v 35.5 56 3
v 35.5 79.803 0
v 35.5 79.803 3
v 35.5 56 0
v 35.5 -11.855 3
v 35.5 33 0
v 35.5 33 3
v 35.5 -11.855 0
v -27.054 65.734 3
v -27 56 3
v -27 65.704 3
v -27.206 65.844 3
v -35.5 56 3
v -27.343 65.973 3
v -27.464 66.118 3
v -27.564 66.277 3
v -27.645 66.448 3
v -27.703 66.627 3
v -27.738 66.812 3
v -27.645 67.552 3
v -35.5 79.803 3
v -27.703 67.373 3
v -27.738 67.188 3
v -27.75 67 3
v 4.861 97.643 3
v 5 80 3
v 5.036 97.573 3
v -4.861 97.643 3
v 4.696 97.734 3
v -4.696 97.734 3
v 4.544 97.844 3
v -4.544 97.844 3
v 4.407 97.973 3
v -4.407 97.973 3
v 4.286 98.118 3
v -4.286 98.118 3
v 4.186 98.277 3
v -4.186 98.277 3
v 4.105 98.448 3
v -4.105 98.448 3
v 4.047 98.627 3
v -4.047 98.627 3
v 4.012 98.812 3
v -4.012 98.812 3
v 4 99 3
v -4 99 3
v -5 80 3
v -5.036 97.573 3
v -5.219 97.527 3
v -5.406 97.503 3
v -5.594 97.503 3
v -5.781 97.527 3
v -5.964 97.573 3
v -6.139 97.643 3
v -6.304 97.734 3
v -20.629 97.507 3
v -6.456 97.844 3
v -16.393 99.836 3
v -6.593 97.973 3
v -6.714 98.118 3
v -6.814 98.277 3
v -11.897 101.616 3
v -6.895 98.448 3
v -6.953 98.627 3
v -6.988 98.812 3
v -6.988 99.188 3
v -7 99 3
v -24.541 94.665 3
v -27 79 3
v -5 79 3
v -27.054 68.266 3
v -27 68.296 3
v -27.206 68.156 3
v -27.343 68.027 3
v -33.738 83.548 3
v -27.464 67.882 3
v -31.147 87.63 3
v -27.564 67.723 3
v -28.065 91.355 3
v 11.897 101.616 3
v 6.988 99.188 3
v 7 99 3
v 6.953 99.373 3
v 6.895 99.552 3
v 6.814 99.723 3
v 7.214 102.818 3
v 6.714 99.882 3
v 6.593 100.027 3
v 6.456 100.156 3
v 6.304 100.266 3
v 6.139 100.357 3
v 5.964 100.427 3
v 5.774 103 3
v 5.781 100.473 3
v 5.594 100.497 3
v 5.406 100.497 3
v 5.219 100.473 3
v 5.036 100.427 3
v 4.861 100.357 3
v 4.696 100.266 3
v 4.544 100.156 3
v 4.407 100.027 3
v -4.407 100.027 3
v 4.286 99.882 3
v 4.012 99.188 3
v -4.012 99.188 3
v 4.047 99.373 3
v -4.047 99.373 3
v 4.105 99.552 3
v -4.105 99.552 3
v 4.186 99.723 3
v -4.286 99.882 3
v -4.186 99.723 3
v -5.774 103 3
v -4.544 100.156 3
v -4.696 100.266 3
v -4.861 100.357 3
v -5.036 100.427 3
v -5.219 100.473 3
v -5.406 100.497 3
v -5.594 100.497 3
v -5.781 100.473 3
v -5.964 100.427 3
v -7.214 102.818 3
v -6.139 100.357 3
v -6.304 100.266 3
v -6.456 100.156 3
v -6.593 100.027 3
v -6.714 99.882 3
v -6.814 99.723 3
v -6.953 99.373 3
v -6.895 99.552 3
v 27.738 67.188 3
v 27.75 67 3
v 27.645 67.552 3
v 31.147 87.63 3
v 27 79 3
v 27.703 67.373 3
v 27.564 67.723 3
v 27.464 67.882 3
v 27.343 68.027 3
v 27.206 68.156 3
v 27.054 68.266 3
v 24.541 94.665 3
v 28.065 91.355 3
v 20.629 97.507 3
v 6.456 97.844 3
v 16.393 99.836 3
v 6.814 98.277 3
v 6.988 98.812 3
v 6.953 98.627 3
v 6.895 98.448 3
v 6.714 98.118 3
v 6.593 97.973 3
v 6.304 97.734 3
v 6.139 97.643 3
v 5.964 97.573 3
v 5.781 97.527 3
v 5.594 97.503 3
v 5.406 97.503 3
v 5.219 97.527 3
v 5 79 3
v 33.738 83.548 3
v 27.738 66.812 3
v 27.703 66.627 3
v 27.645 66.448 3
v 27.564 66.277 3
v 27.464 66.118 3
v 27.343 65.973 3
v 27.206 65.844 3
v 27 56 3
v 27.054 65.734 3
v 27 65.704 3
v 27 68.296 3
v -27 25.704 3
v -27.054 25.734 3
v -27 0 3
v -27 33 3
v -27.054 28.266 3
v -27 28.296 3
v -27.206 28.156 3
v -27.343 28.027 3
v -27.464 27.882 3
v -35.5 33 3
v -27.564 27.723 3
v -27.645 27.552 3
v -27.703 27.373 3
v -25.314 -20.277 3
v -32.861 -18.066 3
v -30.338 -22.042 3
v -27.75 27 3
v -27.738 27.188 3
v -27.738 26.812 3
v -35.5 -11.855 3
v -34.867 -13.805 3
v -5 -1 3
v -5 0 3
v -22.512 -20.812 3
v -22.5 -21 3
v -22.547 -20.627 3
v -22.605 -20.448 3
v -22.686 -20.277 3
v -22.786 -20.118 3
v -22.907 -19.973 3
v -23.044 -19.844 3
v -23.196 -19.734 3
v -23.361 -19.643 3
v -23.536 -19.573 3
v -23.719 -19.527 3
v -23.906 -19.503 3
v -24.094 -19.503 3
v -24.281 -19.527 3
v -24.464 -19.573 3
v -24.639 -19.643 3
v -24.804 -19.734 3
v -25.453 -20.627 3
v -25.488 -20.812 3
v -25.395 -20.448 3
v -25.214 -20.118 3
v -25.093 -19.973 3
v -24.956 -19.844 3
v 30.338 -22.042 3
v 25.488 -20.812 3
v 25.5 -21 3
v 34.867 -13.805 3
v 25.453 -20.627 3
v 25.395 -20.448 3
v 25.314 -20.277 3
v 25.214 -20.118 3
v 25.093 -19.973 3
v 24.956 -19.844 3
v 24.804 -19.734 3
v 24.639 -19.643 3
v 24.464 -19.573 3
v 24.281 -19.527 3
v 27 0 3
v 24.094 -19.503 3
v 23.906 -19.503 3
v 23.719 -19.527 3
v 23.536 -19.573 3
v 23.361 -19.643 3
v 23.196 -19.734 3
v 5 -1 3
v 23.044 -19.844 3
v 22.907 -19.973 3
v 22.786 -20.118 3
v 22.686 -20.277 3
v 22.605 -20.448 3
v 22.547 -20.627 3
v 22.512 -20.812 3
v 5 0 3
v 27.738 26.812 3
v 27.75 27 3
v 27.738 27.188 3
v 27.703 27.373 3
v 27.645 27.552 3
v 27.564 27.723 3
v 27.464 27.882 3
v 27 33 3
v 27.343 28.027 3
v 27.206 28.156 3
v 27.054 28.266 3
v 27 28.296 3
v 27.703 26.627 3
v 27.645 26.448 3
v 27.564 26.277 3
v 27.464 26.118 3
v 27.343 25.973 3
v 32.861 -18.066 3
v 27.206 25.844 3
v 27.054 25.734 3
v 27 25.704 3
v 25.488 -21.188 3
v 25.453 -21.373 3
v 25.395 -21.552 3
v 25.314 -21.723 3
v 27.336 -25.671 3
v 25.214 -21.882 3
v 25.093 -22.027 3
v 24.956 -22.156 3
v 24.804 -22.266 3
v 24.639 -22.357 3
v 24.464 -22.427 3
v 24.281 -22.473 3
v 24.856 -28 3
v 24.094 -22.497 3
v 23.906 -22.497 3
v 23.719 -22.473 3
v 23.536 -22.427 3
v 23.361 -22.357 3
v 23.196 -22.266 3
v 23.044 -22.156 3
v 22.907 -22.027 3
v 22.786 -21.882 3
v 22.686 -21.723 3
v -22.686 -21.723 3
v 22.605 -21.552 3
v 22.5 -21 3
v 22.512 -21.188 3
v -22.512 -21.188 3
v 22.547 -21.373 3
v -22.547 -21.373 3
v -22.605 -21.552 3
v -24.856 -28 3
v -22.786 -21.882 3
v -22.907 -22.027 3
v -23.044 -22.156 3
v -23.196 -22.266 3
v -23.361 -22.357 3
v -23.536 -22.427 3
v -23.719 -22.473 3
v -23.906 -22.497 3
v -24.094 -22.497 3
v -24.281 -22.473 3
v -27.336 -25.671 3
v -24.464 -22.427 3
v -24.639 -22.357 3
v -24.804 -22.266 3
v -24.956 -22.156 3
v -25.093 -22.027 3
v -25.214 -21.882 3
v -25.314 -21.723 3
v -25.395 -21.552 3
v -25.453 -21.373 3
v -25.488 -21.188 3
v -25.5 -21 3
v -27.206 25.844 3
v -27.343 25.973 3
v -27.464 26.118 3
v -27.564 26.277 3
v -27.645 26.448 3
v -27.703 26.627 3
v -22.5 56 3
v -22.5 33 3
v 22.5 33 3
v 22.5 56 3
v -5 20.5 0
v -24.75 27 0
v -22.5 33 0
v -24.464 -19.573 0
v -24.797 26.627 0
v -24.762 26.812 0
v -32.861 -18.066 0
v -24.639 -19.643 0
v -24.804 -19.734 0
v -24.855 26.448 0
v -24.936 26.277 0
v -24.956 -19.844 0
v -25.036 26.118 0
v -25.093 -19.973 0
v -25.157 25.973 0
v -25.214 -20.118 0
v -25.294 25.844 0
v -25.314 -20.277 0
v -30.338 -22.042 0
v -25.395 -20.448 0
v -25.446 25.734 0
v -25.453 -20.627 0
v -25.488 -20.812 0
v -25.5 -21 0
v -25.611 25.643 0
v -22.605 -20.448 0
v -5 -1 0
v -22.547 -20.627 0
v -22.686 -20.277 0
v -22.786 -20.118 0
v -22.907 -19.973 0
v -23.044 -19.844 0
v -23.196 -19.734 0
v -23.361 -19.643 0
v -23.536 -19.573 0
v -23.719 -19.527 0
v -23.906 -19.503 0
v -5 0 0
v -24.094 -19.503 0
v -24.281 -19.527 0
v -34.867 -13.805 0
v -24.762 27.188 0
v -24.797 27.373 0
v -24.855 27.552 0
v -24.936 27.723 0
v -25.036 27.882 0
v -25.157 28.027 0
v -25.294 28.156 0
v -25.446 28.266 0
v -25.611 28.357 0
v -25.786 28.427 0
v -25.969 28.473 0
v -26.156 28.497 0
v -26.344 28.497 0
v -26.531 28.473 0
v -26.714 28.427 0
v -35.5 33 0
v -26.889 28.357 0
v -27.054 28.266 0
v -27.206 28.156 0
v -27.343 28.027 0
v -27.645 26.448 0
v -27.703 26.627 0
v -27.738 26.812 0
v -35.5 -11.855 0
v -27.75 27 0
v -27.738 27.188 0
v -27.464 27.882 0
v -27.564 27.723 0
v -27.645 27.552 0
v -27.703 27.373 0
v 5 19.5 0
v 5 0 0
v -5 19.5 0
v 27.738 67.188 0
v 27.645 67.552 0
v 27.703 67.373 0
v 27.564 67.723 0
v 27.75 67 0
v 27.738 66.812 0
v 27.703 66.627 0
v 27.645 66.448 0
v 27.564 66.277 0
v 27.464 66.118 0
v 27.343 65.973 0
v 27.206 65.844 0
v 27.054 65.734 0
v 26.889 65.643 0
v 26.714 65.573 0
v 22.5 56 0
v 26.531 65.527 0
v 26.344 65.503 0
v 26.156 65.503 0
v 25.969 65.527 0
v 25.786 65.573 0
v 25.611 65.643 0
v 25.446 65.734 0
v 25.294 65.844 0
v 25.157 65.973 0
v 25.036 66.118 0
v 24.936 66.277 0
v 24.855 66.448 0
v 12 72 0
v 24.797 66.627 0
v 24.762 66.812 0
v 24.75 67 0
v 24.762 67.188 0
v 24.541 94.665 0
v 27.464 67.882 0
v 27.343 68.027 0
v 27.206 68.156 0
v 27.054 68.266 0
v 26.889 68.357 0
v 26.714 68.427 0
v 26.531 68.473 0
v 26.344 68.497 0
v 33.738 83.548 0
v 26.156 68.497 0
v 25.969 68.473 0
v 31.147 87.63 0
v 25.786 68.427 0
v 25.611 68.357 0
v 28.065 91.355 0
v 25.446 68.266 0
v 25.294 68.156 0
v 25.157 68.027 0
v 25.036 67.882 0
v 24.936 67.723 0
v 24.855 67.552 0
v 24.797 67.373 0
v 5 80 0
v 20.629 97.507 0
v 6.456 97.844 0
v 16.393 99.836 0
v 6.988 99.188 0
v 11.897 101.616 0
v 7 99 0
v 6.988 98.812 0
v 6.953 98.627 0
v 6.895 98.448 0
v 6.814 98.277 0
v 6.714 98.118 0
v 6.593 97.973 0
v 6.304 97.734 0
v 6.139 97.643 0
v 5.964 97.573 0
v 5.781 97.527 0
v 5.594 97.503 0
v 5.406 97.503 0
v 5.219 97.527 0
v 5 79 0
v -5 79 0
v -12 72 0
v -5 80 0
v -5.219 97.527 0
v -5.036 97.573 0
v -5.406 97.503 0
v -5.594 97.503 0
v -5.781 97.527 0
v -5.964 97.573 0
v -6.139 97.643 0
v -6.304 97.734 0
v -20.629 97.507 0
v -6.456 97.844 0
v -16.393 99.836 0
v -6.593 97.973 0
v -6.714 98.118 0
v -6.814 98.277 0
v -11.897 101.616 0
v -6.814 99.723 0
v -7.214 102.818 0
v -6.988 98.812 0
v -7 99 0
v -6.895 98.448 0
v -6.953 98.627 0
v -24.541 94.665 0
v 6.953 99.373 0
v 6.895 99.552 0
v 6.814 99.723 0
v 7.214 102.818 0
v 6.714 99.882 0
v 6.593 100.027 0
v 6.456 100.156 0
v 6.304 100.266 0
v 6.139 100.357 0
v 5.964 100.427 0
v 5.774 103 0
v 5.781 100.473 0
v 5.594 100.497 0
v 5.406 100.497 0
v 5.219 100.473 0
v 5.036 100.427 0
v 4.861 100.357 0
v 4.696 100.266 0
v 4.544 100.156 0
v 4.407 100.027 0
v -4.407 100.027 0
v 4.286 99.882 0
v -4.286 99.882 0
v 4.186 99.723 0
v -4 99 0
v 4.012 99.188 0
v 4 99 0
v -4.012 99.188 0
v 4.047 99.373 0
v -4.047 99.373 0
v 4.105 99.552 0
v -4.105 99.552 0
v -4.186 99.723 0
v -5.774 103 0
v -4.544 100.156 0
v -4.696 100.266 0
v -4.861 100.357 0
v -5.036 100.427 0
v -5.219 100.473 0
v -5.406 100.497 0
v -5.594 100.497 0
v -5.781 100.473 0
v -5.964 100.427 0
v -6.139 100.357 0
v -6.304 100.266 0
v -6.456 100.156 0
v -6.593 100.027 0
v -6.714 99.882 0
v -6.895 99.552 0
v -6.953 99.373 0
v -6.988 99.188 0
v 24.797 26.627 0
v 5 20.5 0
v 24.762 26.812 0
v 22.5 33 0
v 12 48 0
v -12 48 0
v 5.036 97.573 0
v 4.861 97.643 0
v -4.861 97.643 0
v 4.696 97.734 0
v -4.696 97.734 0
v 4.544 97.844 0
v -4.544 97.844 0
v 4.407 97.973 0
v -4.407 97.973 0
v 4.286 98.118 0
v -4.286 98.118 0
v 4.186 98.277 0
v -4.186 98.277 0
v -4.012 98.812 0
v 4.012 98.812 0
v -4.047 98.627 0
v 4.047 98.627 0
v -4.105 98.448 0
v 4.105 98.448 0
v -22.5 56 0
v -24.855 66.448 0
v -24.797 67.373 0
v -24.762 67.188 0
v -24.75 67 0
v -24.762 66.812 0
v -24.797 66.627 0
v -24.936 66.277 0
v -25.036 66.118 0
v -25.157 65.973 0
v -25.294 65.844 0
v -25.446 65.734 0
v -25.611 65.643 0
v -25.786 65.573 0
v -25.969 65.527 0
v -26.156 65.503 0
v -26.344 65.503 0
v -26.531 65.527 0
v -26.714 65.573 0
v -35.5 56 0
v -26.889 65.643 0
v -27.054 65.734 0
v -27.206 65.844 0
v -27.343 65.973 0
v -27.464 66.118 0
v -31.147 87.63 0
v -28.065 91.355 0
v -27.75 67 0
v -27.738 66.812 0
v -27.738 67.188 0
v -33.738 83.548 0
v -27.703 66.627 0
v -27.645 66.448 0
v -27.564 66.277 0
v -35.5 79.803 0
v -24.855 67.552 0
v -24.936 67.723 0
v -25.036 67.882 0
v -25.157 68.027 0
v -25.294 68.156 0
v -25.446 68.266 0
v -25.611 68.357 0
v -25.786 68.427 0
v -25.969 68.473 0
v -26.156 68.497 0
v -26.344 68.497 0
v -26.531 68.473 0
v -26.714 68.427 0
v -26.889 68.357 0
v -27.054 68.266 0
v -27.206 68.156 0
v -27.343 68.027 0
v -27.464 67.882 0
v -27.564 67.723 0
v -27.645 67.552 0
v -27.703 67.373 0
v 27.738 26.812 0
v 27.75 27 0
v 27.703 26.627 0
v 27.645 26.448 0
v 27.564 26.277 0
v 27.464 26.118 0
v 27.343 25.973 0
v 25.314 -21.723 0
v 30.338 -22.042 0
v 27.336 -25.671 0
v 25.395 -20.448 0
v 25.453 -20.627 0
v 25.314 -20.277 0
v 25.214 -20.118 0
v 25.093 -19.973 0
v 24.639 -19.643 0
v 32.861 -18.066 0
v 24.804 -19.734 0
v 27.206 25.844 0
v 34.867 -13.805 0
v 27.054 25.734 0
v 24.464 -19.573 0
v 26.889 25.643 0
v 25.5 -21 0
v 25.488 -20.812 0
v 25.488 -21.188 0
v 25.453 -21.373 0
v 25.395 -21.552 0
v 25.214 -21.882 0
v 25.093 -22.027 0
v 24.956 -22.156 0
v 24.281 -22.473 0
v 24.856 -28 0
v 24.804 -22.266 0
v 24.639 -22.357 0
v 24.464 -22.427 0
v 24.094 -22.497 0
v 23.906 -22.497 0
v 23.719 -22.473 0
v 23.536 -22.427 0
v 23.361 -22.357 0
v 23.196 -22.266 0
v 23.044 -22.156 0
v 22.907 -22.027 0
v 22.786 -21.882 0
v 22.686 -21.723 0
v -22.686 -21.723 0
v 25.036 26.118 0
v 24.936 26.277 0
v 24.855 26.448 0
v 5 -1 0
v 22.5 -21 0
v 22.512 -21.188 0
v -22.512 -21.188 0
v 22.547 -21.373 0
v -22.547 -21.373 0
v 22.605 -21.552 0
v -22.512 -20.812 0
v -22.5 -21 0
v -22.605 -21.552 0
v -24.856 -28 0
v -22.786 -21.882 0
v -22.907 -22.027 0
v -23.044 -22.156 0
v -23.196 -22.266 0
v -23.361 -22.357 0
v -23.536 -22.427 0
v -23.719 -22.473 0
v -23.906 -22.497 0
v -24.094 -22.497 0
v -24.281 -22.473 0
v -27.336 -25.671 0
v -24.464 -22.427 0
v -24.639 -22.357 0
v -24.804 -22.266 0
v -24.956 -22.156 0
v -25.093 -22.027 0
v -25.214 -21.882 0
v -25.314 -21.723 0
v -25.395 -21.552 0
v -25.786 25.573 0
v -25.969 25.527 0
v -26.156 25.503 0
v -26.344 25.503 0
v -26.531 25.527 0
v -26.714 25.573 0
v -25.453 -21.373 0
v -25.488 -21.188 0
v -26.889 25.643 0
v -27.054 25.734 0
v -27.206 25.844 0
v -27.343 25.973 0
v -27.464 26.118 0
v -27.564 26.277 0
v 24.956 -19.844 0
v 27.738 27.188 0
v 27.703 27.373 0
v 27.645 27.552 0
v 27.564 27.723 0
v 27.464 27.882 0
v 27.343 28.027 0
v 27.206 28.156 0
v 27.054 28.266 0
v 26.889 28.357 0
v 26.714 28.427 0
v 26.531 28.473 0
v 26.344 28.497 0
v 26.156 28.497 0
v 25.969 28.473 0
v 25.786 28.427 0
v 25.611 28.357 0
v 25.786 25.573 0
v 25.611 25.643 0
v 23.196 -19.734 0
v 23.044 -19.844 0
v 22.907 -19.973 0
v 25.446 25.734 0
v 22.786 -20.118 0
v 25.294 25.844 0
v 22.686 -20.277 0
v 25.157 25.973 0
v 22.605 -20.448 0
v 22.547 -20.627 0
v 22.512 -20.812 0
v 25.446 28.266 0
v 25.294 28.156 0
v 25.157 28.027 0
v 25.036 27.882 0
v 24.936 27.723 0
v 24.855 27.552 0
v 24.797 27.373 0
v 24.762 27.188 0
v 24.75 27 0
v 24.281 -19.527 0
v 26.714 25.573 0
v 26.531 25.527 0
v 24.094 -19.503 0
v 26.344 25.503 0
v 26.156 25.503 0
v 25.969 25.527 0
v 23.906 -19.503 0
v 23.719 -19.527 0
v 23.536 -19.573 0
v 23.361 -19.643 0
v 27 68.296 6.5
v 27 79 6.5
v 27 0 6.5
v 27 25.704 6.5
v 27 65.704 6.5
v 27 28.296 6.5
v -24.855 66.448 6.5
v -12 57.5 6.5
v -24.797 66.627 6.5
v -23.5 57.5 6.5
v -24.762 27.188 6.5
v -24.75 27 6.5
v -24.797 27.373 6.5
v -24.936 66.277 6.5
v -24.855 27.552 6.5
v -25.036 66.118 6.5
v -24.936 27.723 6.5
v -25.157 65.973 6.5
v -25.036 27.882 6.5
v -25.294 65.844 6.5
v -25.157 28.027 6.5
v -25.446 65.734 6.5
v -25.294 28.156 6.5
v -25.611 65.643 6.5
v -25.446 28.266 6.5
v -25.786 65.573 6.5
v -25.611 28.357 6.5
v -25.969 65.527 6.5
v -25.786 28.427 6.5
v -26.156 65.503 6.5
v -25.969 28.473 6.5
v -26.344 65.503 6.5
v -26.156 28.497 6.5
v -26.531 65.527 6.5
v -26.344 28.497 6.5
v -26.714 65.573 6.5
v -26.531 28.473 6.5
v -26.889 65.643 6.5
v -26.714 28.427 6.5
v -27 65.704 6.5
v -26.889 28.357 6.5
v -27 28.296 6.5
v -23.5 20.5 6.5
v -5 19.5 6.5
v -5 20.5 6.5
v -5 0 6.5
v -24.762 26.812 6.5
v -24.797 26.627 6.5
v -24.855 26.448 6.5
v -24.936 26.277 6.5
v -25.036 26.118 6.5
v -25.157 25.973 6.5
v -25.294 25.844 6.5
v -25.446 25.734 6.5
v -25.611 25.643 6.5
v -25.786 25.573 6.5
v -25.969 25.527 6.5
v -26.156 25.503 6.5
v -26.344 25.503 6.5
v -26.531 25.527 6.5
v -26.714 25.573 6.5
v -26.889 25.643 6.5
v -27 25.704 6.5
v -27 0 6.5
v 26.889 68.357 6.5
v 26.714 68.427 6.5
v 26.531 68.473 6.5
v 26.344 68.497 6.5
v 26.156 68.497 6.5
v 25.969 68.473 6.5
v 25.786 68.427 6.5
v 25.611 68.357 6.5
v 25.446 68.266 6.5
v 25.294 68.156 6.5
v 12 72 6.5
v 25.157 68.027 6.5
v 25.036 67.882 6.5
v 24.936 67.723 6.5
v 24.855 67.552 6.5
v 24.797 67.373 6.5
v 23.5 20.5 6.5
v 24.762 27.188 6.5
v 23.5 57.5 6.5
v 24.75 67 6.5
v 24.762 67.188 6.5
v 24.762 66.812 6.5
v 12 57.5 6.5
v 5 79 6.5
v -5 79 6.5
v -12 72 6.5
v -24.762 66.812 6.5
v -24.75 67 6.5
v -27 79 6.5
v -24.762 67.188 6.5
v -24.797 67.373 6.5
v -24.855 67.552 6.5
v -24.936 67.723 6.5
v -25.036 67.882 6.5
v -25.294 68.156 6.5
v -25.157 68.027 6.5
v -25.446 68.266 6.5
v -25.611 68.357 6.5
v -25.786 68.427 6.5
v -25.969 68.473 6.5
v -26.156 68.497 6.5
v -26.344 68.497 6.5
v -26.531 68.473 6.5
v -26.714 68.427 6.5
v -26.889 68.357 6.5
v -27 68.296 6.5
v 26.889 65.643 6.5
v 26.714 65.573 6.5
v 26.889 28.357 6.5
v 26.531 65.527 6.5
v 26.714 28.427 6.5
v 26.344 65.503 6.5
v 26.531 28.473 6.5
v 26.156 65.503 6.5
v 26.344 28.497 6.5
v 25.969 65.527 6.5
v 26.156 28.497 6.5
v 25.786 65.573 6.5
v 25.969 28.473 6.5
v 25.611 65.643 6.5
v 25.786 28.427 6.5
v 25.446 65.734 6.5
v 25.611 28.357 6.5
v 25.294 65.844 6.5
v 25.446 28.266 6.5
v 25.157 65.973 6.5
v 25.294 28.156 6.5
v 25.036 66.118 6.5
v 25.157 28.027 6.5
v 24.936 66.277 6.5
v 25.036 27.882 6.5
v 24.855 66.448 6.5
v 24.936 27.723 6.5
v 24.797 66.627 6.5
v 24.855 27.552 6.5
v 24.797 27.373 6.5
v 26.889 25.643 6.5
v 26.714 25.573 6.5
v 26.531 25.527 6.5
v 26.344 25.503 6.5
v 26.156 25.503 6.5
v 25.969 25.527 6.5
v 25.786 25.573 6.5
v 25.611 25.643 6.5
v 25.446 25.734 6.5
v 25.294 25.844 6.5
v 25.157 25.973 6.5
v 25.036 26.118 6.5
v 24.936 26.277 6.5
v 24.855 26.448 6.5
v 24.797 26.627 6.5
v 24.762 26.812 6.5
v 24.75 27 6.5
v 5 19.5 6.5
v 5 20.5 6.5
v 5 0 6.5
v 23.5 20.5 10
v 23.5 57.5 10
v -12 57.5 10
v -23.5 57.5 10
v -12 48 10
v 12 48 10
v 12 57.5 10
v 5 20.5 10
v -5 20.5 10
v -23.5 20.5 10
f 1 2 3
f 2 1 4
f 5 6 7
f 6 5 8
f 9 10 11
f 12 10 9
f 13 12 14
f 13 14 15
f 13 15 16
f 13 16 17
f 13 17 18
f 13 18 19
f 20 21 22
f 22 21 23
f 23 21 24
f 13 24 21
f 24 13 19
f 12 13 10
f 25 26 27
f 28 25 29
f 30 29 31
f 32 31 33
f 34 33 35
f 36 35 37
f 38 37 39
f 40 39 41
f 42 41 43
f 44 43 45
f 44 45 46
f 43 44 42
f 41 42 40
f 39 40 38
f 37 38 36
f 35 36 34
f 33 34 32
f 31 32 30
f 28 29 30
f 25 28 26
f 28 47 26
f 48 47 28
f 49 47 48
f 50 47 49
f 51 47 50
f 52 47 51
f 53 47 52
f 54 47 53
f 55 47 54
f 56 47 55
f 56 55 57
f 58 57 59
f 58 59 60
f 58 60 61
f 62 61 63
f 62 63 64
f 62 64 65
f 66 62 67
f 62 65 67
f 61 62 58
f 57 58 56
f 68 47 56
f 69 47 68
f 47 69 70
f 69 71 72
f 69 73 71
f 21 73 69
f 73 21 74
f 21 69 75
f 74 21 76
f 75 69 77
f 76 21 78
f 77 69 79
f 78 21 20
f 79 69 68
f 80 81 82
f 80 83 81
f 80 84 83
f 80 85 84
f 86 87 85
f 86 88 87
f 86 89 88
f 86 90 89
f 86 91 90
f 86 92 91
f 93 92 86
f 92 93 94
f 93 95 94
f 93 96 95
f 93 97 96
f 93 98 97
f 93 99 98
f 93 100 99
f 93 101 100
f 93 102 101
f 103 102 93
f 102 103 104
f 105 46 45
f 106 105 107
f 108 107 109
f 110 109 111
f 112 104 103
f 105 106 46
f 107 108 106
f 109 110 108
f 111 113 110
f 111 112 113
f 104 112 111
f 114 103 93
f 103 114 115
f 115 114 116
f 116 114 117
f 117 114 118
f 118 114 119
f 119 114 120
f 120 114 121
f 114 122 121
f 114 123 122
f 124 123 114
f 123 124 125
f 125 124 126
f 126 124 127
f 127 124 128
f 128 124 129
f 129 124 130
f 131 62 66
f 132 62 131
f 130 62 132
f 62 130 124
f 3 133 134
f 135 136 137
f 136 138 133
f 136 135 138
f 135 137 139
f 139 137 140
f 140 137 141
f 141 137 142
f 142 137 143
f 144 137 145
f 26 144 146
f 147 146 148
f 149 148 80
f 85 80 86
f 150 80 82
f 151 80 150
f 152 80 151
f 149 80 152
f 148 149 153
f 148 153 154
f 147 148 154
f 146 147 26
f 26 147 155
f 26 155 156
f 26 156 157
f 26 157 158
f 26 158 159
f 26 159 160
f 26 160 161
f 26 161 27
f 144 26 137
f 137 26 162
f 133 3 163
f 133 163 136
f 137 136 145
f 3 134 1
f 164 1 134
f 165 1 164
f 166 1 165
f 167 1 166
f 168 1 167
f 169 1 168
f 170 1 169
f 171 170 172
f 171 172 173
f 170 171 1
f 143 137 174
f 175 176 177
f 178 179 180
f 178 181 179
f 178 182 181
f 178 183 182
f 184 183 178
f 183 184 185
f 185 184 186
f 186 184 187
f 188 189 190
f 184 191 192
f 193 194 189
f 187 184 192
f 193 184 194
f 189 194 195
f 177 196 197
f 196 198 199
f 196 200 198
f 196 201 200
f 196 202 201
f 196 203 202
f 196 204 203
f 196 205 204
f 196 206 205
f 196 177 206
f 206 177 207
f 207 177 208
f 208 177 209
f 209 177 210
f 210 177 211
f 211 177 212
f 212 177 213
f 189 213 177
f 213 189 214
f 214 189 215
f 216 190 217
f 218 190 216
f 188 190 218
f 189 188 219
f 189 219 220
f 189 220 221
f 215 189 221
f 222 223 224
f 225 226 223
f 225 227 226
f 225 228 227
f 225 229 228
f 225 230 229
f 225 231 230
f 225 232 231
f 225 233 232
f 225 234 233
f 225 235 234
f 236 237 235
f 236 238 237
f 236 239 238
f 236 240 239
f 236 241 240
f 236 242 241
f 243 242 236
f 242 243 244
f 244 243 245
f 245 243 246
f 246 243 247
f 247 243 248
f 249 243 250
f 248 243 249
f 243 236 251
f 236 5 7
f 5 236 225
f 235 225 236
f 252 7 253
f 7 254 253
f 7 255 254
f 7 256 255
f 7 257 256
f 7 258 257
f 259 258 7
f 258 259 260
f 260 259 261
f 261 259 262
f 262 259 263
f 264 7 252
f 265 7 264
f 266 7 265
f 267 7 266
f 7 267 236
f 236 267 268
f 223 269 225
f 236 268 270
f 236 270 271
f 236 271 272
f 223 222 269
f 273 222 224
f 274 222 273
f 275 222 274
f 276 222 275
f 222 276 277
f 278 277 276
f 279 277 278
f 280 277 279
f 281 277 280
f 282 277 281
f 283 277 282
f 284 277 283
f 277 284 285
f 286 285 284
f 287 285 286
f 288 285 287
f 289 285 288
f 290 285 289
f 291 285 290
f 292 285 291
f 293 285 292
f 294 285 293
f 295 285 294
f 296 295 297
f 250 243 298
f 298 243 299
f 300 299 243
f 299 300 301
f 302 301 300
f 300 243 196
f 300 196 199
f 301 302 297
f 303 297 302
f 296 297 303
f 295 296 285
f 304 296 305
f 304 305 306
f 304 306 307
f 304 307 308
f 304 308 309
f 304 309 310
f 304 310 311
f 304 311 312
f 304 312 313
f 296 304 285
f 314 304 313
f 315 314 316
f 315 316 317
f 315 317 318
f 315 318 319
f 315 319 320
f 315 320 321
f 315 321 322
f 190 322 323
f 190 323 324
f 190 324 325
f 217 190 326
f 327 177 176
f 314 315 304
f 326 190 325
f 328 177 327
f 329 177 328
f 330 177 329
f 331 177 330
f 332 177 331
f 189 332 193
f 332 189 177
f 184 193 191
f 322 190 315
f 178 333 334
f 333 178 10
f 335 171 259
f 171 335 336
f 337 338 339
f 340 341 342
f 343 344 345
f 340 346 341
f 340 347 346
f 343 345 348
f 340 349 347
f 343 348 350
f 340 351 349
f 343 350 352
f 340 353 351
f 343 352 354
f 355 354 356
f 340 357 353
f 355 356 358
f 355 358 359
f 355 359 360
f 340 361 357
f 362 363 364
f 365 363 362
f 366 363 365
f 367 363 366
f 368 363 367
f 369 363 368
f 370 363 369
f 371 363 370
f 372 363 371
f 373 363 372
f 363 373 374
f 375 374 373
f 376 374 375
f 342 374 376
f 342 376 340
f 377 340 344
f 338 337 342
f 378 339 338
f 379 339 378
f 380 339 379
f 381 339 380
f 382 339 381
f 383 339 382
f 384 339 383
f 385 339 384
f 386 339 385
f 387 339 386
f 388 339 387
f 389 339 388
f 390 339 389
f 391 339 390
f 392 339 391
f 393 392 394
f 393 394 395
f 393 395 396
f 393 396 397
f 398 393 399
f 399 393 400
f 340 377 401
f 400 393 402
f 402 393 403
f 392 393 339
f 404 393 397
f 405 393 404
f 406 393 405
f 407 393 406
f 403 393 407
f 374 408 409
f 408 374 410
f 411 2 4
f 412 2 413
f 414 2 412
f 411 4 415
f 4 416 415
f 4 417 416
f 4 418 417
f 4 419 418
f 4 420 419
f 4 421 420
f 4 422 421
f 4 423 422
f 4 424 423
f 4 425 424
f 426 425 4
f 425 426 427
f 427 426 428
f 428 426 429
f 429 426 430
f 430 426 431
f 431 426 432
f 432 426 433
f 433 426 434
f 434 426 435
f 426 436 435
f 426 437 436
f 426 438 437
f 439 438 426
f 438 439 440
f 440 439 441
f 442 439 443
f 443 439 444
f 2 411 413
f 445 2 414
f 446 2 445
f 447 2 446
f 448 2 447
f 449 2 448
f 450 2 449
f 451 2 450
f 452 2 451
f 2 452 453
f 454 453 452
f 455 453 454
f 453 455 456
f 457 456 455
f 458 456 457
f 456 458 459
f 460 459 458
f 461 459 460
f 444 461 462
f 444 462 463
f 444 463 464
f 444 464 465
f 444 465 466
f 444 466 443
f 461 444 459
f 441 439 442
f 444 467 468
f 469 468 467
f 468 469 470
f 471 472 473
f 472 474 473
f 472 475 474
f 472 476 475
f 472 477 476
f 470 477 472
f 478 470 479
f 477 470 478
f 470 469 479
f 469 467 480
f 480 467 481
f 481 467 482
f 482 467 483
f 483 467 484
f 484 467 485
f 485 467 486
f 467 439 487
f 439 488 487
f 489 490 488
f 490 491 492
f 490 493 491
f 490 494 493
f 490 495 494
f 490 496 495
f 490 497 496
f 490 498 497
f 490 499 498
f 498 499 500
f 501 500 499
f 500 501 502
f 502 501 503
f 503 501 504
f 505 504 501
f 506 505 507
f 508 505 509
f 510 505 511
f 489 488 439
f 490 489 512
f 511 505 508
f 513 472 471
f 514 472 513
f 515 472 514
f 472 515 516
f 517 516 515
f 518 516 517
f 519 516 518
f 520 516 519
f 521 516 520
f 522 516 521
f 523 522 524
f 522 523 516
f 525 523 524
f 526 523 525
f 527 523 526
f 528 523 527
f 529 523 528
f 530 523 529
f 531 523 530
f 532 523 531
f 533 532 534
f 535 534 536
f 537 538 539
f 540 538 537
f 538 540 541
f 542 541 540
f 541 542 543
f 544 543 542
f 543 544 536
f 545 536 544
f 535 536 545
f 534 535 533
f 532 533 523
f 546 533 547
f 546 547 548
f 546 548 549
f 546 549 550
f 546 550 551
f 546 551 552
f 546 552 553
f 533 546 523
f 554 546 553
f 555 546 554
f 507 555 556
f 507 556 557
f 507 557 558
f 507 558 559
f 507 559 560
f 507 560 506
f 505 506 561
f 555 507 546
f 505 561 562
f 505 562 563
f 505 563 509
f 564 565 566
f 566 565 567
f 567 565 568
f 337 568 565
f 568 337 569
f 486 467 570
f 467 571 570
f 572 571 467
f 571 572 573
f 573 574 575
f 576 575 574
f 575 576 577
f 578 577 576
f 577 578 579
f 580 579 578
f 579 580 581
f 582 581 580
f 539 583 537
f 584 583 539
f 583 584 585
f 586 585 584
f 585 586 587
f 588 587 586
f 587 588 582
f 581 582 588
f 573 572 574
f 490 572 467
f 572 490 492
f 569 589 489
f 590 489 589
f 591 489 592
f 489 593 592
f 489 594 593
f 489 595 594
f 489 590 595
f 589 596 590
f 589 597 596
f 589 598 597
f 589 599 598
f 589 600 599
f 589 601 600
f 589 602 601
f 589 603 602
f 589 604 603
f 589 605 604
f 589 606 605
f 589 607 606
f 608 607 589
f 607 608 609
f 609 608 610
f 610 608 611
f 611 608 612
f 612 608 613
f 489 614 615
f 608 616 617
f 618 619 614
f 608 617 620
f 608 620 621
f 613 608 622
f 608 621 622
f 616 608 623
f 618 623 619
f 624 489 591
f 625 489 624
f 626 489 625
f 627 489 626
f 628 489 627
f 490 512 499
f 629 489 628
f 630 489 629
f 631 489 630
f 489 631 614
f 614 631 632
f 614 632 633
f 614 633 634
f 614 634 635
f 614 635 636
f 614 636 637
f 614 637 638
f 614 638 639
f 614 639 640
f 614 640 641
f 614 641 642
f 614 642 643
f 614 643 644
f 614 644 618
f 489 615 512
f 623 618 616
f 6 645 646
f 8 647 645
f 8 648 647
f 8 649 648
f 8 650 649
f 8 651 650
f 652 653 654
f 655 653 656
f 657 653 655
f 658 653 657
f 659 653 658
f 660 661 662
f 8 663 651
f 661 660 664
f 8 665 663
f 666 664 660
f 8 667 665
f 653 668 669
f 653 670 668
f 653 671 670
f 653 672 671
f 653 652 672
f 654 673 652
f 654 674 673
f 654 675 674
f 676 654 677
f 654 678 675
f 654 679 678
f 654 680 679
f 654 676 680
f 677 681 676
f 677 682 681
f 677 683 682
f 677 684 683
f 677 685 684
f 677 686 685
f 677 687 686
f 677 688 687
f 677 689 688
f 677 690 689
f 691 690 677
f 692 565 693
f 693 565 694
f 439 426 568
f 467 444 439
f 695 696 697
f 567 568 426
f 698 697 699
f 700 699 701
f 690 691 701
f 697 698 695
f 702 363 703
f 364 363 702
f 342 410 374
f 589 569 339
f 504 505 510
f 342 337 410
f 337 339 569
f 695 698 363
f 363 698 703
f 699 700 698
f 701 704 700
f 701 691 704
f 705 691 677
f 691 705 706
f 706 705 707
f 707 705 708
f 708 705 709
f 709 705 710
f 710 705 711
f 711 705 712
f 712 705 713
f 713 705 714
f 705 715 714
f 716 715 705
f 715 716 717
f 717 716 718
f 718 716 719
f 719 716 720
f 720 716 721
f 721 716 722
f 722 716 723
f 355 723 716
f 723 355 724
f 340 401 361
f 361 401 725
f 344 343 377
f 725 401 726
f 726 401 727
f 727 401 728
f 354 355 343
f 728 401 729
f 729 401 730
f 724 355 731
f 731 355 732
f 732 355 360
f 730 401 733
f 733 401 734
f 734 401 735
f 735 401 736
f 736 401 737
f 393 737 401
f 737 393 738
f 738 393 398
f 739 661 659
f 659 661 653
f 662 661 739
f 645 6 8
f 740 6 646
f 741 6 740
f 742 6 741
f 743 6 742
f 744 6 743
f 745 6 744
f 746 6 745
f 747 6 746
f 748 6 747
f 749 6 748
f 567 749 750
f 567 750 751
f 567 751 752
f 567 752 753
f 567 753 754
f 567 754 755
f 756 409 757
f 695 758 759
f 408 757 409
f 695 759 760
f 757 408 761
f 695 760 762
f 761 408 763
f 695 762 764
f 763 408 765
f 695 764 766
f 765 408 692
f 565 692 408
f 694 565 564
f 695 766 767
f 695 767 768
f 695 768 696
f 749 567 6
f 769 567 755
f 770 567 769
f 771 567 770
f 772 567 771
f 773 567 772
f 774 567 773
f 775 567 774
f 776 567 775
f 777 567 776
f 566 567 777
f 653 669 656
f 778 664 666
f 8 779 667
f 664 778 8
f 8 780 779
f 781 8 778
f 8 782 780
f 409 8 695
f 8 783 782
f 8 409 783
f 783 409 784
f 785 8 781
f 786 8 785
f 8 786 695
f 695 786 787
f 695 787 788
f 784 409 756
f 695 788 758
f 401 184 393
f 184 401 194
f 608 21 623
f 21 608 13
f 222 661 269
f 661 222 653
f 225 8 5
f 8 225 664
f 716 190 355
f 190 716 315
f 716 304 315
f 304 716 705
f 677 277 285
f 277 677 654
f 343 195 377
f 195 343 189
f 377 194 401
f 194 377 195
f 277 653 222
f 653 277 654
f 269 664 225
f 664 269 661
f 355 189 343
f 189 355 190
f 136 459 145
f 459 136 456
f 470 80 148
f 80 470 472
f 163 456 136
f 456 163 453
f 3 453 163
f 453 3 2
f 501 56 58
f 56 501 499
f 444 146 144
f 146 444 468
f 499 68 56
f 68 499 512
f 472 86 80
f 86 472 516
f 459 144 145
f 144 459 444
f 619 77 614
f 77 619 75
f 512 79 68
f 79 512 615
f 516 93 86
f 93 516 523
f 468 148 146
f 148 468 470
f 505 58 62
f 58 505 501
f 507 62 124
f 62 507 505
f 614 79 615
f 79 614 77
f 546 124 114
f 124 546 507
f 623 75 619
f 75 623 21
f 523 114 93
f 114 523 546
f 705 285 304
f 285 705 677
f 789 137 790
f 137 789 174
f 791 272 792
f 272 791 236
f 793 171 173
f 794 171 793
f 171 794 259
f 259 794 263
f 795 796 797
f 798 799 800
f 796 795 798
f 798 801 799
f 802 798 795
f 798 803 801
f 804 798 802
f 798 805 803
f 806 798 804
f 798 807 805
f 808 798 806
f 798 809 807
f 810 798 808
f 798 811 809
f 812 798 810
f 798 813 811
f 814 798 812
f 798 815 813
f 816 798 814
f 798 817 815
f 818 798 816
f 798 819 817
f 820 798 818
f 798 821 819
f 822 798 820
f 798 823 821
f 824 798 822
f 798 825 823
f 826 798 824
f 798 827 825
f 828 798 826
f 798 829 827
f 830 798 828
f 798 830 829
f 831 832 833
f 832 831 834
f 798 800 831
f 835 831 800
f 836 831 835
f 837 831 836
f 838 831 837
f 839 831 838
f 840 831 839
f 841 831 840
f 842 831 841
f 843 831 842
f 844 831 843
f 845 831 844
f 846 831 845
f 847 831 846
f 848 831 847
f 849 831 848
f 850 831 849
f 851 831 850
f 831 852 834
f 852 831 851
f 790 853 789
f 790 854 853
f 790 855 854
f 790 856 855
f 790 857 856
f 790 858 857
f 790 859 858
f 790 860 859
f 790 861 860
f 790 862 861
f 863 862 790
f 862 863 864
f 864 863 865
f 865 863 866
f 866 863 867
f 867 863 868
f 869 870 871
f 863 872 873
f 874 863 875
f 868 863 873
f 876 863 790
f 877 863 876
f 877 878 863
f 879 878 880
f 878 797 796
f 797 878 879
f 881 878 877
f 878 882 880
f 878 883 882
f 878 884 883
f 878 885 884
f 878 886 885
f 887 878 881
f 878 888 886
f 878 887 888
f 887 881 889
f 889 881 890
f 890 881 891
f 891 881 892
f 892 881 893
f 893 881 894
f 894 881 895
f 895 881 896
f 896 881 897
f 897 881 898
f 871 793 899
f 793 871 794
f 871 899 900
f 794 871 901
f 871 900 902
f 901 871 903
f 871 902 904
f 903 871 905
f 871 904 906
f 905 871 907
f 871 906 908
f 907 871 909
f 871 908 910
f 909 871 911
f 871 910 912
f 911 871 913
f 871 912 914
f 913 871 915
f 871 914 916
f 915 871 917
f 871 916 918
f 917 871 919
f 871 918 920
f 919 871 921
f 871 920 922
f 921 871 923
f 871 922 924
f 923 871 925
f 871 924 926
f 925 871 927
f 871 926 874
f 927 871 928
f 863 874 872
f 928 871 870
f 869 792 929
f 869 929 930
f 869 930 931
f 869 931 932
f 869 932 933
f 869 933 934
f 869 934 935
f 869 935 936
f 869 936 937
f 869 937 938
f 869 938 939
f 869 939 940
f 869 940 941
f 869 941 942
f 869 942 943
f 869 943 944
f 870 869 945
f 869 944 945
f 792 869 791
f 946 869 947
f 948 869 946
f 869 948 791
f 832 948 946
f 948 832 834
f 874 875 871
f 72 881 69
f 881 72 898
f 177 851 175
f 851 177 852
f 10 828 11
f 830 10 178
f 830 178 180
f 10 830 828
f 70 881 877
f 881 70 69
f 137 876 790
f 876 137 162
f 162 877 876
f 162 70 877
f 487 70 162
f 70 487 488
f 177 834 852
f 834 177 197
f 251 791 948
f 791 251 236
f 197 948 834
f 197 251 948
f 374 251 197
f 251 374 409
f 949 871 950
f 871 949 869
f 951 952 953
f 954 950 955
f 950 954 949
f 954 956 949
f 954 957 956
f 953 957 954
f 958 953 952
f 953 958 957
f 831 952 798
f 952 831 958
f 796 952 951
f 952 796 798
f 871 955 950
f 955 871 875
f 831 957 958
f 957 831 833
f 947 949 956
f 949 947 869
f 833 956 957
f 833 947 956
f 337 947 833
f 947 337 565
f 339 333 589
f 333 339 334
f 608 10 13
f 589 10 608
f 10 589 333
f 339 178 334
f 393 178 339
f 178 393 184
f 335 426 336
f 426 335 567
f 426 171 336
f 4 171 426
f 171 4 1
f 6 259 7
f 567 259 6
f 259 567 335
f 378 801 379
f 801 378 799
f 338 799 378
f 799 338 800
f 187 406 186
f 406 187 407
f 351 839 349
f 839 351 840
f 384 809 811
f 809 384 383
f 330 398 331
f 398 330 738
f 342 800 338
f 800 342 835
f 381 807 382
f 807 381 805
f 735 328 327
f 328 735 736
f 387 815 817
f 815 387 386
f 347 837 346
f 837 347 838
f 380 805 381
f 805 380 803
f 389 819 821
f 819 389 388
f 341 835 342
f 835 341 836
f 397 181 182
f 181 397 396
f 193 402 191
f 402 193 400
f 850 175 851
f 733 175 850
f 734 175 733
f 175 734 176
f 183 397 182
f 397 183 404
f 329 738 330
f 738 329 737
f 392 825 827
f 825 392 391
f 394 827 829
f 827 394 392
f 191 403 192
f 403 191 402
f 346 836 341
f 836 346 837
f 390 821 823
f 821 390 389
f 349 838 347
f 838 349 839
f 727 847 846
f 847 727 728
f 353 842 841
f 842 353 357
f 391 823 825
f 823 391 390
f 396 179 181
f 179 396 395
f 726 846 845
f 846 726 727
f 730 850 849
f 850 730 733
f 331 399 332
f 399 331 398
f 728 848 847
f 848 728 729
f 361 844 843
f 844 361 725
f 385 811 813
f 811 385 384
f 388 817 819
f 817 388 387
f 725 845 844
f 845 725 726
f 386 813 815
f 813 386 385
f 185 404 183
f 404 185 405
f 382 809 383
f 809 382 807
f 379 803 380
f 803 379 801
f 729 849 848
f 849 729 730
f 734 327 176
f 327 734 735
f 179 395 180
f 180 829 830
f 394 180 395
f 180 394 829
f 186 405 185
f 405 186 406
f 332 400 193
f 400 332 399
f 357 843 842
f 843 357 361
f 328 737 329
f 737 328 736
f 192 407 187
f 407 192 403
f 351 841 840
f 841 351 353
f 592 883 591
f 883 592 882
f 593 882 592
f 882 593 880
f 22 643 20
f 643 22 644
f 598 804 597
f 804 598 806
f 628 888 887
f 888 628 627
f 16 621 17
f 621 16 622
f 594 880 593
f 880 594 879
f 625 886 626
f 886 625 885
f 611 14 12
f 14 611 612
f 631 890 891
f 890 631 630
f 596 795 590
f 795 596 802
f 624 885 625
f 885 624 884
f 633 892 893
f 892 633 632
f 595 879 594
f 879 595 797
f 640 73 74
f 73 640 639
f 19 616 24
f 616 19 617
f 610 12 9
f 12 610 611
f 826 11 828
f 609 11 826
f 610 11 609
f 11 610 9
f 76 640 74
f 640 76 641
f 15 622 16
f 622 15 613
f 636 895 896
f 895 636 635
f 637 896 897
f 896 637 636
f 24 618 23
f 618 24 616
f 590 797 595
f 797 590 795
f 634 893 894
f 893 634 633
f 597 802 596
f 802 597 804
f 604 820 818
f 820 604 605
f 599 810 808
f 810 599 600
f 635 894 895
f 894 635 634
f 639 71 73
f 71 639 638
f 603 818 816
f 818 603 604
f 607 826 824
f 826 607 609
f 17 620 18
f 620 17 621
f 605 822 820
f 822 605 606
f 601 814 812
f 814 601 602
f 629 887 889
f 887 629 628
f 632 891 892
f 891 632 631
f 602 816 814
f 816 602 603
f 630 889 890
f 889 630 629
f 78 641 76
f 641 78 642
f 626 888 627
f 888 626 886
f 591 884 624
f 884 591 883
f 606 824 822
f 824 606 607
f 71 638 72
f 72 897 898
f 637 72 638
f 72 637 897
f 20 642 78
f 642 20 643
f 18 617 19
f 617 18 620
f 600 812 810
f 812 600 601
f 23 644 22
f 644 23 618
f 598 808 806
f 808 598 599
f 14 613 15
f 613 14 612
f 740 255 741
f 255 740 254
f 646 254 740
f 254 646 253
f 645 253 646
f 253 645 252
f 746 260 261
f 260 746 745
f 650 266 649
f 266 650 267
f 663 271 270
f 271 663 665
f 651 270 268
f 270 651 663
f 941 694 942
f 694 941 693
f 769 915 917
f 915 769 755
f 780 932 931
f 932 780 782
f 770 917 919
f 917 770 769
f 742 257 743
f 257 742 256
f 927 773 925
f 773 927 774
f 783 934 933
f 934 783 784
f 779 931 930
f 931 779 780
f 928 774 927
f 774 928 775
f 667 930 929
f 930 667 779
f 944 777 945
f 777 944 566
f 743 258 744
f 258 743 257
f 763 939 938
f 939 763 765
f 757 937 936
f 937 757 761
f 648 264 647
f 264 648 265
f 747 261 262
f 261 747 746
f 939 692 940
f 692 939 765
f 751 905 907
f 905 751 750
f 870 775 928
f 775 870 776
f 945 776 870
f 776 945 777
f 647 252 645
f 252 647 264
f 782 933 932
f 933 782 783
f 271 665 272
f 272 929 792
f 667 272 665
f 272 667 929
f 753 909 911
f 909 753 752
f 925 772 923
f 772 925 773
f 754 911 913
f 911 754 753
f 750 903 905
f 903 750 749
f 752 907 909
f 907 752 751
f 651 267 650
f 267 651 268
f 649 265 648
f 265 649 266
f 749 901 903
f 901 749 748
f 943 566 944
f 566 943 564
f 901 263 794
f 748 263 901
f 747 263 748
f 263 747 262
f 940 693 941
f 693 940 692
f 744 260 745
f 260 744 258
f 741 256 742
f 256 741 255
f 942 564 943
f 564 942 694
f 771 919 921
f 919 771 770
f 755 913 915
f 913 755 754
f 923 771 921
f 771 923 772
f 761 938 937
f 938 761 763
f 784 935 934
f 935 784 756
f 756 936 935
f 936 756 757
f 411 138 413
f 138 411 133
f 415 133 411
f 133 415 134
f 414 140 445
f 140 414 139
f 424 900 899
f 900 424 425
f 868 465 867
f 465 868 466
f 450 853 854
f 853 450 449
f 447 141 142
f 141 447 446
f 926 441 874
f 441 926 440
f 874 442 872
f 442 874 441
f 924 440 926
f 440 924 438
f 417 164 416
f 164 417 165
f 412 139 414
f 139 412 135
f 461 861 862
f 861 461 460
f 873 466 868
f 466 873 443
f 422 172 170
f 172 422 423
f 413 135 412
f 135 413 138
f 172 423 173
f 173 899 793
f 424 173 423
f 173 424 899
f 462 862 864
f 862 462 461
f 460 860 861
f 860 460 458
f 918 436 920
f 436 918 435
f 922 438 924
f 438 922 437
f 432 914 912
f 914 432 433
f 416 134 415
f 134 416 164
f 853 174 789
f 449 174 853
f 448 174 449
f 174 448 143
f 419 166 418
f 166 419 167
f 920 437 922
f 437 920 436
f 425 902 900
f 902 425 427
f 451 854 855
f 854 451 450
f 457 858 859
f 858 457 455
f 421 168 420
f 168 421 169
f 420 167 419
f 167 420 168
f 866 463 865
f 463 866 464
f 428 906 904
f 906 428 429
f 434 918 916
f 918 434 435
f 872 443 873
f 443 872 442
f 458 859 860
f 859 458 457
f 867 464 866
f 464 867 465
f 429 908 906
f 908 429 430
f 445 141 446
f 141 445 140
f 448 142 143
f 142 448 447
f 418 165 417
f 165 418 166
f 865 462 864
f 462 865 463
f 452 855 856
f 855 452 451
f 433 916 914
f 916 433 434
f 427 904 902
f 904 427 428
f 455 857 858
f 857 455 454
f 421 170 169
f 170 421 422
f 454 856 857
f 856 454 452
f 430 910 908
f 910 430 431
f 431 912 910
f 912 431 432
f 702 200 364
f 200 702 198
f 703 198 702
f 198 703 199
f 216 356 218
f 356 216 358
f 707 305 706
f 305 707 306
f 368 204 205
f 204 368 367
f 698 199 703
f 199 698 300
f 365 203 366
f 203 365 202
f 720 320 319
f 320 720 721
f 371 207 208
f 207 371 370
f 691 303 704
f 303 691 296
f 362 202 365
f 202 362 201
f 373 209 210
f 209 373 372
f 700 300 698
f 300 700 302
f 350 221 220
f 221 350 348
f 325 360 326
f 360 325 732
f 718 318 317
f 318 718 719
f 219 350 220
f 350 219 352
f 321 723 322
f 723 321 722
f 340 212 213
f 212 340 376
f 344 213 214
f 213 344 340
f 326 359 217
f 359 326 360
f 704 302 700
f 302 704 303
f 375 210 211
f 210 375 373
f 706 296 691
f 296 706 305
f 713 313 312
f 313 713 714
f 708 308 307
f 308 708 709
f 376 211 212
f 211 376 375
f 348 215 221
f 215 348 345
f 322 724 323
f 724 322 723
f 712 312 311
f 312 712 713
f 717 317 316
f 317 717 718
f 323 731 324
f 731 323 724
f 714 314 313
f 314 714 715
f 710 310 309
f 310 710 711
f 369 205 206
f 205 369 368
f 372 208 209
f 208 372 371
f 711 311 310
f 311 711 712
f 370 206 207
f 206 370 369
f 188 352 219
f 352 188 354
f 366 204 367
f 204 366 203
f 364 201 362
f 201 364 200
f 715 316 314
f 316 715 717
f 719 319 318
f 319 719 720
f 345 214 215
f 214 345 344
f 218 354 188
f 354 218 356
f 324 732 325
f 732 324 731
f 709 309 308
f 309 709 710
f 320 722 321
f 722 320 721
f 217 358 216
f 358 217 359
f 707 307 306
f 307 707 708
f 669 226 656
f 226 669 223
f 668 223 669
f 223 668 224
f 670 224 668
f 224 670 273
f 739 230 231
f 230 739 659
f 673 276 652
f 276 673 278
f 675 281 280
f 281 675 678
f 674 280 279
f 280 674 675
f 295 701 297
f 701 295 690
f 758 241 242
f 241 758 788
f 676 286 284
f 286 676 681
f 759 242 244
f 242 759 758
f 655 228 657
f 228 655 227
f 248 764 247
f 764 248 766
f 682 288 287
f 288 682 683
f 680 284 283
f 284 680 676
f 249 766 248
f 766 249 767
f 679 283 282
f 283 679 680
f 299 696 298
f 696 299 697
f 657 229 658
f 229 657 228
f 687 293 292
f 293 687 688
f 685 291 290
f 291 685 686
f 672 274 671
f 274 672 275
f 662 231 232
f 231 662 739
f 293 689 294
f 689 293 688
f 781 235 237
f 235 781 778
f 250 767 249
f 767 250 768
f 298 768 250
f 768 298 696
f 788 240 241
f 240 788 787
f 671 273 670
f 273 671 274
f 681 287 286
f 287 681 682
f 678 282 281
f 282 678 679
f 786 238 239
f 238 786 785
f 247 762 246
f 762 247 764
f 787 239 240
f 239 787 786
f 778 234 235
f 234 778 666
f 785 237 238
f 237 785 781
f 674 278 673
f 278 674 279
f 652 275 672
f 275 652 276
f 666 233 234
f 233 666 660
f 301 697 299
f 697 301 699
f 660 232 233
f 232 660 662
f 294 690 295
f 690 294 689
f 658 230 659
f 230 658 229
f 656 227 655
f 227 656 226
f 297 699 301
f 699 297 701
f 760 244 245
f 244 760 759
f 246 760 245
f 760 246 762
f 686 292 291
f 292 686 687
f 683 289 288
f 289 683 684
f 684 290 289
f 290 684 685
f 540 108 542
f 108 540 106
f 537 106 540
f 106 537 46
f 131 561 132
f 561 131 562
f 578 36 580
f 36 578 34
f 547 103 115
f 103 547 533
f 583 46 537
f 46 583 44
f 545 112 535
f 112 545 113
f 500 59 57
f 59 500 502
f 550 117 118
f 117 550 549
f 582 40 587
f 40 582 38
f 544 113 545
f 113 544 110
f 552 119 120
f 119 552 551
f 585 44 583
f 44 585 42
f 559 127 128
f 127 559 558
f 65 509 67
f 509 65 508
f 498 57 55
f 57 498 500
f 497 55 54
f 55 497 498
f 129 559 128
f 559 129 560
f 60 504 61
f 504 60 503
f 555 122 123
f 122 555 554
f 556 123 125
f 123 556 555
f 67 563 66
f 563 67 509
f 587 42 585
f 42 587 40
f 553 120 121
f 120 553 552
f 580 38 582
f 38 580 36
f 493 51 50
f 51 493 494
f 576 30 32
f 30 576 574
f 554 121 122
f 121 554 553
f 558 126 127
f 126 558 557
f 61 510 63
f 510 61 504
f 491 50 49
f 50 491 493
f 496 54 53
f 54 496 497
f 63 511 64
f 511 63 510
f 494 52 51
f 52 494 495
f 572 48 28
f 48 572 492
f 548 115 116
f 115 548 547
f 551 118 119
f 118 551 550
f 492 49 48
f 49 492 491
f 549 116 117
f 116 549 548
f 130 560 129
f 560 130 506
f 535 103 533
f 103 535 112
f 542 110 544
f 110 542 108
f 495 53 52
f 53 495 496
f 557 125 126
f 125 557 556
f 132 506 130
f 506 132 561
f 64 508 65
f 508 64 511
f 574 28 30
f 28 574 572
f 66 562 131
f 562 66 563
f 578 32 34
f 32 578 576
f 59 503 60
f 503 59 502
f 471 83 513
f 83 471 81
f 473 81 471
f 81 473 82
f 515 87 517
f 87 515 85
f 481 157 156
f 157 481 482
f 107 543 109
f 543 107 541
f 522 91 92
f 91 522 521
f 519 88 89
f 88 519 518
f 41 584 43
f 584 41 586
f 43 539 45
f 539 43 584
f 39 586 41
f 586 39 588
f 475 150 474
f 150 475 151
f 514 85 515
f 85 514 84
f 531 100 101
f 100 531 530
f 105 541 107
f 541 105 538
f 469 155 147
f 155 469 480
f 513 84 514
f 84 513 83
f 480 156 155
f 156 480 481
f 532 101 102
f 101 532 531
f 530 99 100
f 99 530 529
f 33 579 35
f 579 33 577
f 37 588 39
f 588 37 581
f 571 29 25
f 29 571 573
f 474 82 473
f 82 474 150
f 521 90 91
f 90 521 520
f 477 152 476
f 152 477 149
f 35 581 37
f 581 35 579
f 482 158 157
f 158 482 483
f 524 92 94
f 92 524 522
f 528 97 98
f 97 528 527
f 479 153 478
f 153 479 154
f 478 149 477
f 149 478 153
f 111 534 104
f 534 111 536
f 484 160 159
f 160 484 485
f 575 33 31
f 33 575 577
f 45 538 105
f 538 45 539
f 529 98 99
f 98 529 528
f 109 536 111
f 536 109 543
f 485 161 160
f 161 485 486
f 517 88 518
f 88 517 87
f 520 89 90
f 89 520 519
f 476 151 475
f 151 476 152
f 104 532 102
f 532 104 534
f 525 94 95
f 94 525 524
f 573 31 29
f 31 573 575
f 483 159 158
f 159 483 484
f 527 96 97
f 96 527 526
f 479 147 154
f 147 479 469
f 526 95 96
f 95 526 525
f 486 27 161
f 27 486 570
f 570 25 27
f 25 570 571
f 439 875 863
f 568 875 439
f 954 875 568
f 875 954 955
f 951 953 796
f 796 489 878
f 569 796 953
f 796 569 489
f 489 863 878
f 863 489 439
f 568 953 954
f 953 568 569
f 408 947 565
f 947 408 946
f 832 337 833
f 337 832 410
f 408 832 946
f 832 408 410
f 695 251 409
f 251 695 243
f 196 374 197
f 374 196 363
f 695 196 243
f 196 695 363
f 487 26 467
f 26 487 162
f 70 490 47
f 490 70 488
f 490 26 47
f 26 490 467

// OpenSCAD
RISER_WIDTH = 54;
RISER_LENGTH = 79;
RISER_HEIGHT = 3.5; // TODO

CONNECTOR_WIDTH = 47;
CONNECTOR_LENGTH = 37;
CONNECTOR_HEIGHT = 3.5;
CONNECTOR_OFFSET = 20.5;

BASE_WIDTH = 71;
BASE_LENGTH = 131;
BASE_HEIGHT = 3;
BASE_FRONT_DIA = 75;
BASE_FRONT_OFFSET = 0;
BASE_BACK_DIA = 77;
BASE_BACK_OFFSET = 65;
BASE_OFFSET = -28;

CHANNEL_WIDTH = 24;
CHANNEL_LENGTH = 24;
CHANNEL_HEIGHT = 50;
CHANNEL_OFFSET = 48;

TABS_WIDTH = 13;
TABS_LENGTH = 23;
TABS_HEIGHT = BASE_HEIGHT;
TABS_OFFSET = 33;

TOP_MOUNT_HOLES_DIA = 3;
TOP_MOUNT_HOLES_SPACING_X = 52.5;
TOP_MOUNT_HOLES_SPACING_Y = 40;
TOP_MOUNT_HOLES_HEIGHT = 23;
TOP_MOUNT_HOLES_OFFSET = 27;

BOTTOM_MOUNT_HOLES_DIA = 3;
BOTTOM_MOUNT_HOLES_SPACING_X_FRONT = 48;
BOTTOM_MOUNT_HOLES_SPACING_X_BACK = 11;
BOTTOM_MOUNT_HOLES_SPACING_Y = 120;
BOTTOM_MOUNT_HOLES_HEIGHT = 23;
BOTTOM_MOUNT_HOLES_OFFSET = -21;

SLOT_WIDTH = 10;
SLOT_LENGTH = 1;
SLOT_HEIGHT = 23;

$fn = 50;

module base() {
    intersection() {
        union() {
            translate([-BASE_WIDTH/2, 0, 0])
            cube(size = [BASE_WIDTH, RISER_LENGTH, BASE_HEIGHT]);
            translate([0, BASE_FRONT_OFFSET, 0])
            cylinder(d = BASE_FRONT_DIA, h = BASE_HEIGHT);
            translate([0, BASE_BACK_OFFSET, 0])
            cylinder(d = BASE_BACK_DIA, h = BASE_HEIGHT);
        }
        translate([-BASE_WIDTH/2, BASE_OFFSET, 0])
        cube(size = [BASE_WIDTH, BASE_LENGTH, BASE_HEIGHT]);
    }
}

module riser() {
  translate([-RISER_WIDTH/2, 0, 0])
      cube(size = [RISER_WIDTH, RISER_LENGTH, RISER_HEIGHT]);
}

module connector() {
  translate([-CONNECTOR_WIDTH/2, 0, 0])
      cube(size = [CONNECTOR_WIDTH, CONNECTOR_LENGTH, CONNECTOR_HEIGHT]);
}

module channel() {
  translate([-CHANNEL_WIDTH/2, 0, 0])
      cube(size = [CHANNEL_WIDTH, CHANNEL_LENGTH, CHANNEL_HEIGHT]);
}

module tabs() {
  translate([-TABS_WIDTH/2 - (BASE_WIDTH-TABS_WIDTH)/2, 0, 0])
      cube(size = [TABS_WIDTH, TABS_LENGTH, TABS_HEIGHT]);

  translate([-TABS_WIDTH/2 + (BASE_WIDTH-TABS_WIDTH)/2, 0, 0])
      cube(size = [TABS_WIDTH, TABS_LENGTH, TABS_HEIGHT]);

}

module top_holes() {
    translate([0, TOP_MOUNT_HOLES_SPACING_Y/2, 0])
    for(i = [-1, 1]) {
        for(j = [-1, 1]) {
            translate([i * TOP_MOUNT_HOLES_SPACING_X/2, j * TOP_MOUNT_HOLES_SPACING_Y/2, 0])
            cylinder(d = TOP_MOUNT_HOLES_DIA, h = TOP_MOUNT_HOLES_HEIGHT);
        }
    }
}

module bottom_holes() {
    translate([0, BOTTOM_MOUNT_HOLES_SPACING_Y/2, 0])
    union() {
        for(i = [-1, 1]) {
            translate([i * BOTTOM_MOUNT_HOLES_SPACING_X_FRONT/2, -BOTTOM_MOUNT_HOLES_SPACING_Y/2, 0])
            cylinder(d = BOTTOM_MOUNT_HOLES_DIA, h = BOTTOM_MOUNT_HOLES_HEIGHT);
        }

        for(i = [-1, 1]) {
            translate([i * BOTTOM_MOUNT_HOLES_SPACING_X_BACK/2, BOTTOM_MOUNT_HOLES_SPACING_Y/2, 0])
            cylinder(d = BOTTOM_MOUNT_HOLES_DIA, h = BOTTOM_MOUNT_HOLES_HEIGHT);
        }
    }
}

module slot() {
    translate([-SLOT_WIDTH/2, -SLOT_LENGTH, 0])
    cube(size = [SLOT_WIDTH, SLOT_LENGTH, SLOT_HEIGHT]);
}

difference() {
  union() {
    base();
    translate([0, 0, BASE_HEIGHT])
    riser();
    translate([0, CONNECTOR_OFFSET, BASE_HEIGHT + RISER_HEIGHT])
    connector();
  }

  #translate([0, CHANNEL_OFFSET, 0])
  channel();

  #translate([0, TABS_OFFSET, 0])
  tabs();

  #translate([0, TOP_MOUNT_HOLES_OFFSET, 0])
  top_holes();

  #translate([0, BOTTOM_MOUNT_HOLES_OFFSET, 0])
  bottom_holes();

  #translate([0, CONNECTOR_OFFSET, 0])
  slot();

  #translate([0, CONNECTOR_OFFSET + CONNECTOR_LENGTH + SLOT_LENGTH, 0])
  slot();

  #slot();

  #translate([0, RISER_LENGTH + SLOT_LENGTH, 0])
  slot();
}
